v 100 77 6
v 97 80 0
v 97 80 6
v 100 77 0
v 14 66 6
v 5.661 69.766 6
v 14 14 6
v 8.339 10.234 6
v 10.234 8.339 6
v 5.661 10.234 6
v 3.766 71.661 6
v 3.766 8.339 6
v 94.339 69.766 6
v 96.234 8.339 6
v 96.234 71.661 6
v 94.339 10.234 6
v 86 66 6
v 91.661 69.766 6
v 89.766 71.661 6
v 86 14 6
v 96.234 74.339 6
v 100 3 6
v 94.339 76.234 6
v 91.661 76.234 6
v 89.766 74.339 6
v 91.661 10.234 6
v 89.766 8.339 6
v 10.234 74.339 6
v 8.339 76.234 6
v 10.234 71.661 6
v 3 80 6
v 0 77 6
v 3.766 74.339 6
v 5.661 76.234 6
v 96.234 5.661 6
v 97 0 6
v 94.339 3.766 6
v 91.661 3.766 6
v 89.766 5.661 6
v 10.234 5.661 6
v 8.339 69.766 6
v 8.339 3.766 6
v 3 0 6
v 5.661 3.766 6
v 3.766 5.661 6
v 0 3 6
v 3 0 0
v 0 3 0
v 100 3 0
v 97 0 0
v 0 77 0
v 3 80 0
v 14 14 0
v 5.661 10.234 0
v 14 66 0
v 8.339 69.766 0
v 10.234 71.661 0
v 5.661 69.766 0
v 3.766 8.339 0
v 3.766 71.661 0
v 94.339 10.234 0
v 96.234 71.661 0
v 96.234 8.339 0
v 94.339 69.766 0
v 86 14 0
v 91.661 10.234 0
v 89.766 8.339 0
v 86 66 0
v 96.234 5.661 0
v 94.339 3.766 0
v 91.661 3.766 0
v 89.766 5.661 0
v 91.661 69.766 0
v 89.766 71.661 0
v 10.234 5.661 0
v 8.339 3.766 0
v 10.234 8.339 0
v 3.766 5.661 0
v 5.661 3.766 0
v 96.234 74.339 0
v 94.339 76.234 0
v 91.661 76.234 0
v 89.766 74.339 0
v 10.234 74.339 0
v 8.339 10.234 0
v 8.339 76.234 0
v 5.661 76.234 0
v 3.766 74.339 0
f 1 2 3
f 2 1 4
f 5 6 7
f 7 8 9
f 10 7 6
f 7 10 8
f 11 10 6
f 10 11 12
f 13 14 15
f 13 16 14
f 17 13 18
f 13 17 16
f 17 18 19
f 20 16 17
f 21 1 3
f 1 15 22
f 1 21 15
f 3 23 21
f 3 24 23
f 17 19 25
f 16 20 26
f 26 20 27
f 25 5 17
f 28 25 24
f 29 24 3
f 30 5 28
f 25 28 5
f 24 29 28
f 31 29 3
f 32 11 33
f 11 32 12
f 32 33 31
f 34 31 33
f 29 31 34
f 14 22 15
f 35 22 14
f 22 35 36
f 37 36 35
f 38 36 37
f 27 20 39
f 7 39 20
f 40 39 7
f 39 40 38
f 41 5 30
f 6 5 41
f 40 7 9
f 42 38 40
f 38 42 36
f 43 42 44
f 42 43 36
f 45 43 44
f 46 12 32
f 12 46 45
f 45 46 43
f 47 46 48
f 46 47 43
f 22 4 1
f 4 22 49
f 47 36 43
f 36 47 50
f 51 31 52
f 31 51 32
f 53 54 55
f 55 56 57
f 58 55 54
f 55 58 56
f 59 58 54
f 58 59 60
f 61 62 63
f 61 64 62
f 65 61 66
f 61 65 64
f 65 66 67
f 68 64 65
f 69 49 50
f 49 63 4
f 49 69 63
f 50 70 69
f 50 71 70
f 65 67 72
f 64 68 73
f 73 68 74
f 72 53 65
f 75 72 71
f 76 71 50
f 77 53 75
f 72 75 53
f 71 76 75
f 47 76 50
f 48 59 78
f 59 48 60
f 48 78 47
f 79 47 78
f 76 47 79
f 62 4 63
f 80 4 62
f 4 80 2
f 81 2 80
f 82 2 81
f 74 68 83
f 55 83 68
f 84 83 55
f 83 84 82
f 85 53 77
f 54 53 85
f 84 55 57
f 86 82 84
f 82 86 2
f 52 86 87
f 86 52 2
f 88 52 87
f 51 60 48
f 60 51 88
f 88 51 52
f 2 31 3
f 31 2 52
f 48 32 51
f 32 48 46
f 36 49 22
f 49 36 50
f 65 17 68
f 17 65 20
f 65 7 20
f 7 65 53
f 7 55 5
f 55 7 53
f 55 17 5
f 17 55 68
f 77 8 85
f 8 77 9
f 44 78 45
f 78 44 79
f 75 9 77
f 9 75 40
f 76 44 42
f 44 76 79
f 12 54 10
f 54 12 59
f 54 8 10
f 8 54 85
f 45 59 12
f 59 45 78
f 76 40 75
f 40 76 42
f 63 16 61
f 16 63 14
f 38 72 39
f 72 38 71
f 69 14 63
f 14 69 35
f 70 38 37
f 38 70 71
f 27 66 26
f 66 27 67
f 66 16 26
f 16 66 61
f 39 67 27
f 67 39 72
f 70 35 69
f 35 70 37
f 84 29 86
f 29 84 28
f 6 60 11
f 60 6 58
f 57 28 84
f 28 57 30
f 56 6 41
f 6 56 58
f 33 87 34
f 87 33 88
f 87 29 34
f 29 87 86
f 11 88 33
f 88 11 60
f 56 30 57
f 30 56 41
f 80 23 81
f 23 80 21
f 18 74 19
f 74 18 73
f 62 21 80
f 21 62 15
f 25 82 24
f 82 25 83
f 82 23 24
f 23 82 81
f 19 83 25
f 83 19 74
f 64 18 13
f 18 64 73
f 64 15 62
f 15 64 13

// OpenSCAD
$fn = 32;

// ----------------------------------------------------------------------
// Frame plate: 100 x 80 frame, 14 mm rails
// ----------------------------------------------------------------------

// --- parameters (mm) ---
plate_l = 100;            // plate length, X
plate_w = 80;             // plate width, Y
plate_t = 6;              // plate thickness, Z (extrusion height)
corner_c = 3;             // corner chamfer
frame_bar = 14;           // frame rail width
bolt_r = 3.5;             // corner bolt window radius
bolt_inset = 7;           // bolt centre inset from the edges

win_l = plate_l - 2 * frame_bar;  // window length
win_w = plate_w - 2 * frame_bar;  // window width
bolt_d = 2 * bolt_r;  // corner hole diameter

profile = [[3, 0], [97, 0], [100, 3], [100, 77], [97, 80], [3, 80], [0, 77], [0, 3]];  // primary outline, 8 points, counter clockwise
void_1 = [[14, 14], [86, 14], [86, 66], [14, 66]];  // the window, 4 points
void_2 = [[10.234, 8.339], [8.339, 10.234], [5.661, 10.234], [3.766, 8.339], [3.766, 5.661], [5.661, 3.766], [8.339, 3.766], [10.234, 5.661]];  // corner bolt window, 8 points
void_3 = [[96.234, 8.339], [94.339, 10.234], [91.661, 10.234], [89.766, 8.339], [89.766, 5.661], [91.661, 3.766], [94.339, 3.766], [96.234, 5.661]];  // corner bolt window, 8 points
void_4 = [[10.234, 74.339], [8.339, 76.234], [5.661, 76.234], [3.766, 74.339], [3.766, 71.661], [5.661, 69.766], [8.339, 69.766], [10.234, 71.661]];  // corner bolt window, 8 points
void_5 = [[96.234, 74.339], [94.339, 76.234], [91.661, 76.234], [89.766, 74.339], [89.766, 71.661], [91.661, 69.766], [94.339, 69.766], [96.234, 71.661]];  // corner bolt window, 8 points

// --- the one profile operation ---
difference() {
  linear_extrude(height = plate_t) polygon(points = profile);
  translate([0, 0, -1])
    linear_extrude(height = plate_t + 2) polygon(points = void_1);
  translate([0, 0, -1])
    linear_extrude(height = plate_t + 2) polygon(points = void_2);
  translate([0, 0, -1])
    linear_extrude(height = plate_t + 2) polygon(points = void_3);
  translate([0, 0, -1])
    linear_extrude(height = plate_t + 2) polygon(points = void_4);
  translate([0, 0, -1])
    linear_extrude(height = plate_t + 2) polygon(points = void_5);
}
